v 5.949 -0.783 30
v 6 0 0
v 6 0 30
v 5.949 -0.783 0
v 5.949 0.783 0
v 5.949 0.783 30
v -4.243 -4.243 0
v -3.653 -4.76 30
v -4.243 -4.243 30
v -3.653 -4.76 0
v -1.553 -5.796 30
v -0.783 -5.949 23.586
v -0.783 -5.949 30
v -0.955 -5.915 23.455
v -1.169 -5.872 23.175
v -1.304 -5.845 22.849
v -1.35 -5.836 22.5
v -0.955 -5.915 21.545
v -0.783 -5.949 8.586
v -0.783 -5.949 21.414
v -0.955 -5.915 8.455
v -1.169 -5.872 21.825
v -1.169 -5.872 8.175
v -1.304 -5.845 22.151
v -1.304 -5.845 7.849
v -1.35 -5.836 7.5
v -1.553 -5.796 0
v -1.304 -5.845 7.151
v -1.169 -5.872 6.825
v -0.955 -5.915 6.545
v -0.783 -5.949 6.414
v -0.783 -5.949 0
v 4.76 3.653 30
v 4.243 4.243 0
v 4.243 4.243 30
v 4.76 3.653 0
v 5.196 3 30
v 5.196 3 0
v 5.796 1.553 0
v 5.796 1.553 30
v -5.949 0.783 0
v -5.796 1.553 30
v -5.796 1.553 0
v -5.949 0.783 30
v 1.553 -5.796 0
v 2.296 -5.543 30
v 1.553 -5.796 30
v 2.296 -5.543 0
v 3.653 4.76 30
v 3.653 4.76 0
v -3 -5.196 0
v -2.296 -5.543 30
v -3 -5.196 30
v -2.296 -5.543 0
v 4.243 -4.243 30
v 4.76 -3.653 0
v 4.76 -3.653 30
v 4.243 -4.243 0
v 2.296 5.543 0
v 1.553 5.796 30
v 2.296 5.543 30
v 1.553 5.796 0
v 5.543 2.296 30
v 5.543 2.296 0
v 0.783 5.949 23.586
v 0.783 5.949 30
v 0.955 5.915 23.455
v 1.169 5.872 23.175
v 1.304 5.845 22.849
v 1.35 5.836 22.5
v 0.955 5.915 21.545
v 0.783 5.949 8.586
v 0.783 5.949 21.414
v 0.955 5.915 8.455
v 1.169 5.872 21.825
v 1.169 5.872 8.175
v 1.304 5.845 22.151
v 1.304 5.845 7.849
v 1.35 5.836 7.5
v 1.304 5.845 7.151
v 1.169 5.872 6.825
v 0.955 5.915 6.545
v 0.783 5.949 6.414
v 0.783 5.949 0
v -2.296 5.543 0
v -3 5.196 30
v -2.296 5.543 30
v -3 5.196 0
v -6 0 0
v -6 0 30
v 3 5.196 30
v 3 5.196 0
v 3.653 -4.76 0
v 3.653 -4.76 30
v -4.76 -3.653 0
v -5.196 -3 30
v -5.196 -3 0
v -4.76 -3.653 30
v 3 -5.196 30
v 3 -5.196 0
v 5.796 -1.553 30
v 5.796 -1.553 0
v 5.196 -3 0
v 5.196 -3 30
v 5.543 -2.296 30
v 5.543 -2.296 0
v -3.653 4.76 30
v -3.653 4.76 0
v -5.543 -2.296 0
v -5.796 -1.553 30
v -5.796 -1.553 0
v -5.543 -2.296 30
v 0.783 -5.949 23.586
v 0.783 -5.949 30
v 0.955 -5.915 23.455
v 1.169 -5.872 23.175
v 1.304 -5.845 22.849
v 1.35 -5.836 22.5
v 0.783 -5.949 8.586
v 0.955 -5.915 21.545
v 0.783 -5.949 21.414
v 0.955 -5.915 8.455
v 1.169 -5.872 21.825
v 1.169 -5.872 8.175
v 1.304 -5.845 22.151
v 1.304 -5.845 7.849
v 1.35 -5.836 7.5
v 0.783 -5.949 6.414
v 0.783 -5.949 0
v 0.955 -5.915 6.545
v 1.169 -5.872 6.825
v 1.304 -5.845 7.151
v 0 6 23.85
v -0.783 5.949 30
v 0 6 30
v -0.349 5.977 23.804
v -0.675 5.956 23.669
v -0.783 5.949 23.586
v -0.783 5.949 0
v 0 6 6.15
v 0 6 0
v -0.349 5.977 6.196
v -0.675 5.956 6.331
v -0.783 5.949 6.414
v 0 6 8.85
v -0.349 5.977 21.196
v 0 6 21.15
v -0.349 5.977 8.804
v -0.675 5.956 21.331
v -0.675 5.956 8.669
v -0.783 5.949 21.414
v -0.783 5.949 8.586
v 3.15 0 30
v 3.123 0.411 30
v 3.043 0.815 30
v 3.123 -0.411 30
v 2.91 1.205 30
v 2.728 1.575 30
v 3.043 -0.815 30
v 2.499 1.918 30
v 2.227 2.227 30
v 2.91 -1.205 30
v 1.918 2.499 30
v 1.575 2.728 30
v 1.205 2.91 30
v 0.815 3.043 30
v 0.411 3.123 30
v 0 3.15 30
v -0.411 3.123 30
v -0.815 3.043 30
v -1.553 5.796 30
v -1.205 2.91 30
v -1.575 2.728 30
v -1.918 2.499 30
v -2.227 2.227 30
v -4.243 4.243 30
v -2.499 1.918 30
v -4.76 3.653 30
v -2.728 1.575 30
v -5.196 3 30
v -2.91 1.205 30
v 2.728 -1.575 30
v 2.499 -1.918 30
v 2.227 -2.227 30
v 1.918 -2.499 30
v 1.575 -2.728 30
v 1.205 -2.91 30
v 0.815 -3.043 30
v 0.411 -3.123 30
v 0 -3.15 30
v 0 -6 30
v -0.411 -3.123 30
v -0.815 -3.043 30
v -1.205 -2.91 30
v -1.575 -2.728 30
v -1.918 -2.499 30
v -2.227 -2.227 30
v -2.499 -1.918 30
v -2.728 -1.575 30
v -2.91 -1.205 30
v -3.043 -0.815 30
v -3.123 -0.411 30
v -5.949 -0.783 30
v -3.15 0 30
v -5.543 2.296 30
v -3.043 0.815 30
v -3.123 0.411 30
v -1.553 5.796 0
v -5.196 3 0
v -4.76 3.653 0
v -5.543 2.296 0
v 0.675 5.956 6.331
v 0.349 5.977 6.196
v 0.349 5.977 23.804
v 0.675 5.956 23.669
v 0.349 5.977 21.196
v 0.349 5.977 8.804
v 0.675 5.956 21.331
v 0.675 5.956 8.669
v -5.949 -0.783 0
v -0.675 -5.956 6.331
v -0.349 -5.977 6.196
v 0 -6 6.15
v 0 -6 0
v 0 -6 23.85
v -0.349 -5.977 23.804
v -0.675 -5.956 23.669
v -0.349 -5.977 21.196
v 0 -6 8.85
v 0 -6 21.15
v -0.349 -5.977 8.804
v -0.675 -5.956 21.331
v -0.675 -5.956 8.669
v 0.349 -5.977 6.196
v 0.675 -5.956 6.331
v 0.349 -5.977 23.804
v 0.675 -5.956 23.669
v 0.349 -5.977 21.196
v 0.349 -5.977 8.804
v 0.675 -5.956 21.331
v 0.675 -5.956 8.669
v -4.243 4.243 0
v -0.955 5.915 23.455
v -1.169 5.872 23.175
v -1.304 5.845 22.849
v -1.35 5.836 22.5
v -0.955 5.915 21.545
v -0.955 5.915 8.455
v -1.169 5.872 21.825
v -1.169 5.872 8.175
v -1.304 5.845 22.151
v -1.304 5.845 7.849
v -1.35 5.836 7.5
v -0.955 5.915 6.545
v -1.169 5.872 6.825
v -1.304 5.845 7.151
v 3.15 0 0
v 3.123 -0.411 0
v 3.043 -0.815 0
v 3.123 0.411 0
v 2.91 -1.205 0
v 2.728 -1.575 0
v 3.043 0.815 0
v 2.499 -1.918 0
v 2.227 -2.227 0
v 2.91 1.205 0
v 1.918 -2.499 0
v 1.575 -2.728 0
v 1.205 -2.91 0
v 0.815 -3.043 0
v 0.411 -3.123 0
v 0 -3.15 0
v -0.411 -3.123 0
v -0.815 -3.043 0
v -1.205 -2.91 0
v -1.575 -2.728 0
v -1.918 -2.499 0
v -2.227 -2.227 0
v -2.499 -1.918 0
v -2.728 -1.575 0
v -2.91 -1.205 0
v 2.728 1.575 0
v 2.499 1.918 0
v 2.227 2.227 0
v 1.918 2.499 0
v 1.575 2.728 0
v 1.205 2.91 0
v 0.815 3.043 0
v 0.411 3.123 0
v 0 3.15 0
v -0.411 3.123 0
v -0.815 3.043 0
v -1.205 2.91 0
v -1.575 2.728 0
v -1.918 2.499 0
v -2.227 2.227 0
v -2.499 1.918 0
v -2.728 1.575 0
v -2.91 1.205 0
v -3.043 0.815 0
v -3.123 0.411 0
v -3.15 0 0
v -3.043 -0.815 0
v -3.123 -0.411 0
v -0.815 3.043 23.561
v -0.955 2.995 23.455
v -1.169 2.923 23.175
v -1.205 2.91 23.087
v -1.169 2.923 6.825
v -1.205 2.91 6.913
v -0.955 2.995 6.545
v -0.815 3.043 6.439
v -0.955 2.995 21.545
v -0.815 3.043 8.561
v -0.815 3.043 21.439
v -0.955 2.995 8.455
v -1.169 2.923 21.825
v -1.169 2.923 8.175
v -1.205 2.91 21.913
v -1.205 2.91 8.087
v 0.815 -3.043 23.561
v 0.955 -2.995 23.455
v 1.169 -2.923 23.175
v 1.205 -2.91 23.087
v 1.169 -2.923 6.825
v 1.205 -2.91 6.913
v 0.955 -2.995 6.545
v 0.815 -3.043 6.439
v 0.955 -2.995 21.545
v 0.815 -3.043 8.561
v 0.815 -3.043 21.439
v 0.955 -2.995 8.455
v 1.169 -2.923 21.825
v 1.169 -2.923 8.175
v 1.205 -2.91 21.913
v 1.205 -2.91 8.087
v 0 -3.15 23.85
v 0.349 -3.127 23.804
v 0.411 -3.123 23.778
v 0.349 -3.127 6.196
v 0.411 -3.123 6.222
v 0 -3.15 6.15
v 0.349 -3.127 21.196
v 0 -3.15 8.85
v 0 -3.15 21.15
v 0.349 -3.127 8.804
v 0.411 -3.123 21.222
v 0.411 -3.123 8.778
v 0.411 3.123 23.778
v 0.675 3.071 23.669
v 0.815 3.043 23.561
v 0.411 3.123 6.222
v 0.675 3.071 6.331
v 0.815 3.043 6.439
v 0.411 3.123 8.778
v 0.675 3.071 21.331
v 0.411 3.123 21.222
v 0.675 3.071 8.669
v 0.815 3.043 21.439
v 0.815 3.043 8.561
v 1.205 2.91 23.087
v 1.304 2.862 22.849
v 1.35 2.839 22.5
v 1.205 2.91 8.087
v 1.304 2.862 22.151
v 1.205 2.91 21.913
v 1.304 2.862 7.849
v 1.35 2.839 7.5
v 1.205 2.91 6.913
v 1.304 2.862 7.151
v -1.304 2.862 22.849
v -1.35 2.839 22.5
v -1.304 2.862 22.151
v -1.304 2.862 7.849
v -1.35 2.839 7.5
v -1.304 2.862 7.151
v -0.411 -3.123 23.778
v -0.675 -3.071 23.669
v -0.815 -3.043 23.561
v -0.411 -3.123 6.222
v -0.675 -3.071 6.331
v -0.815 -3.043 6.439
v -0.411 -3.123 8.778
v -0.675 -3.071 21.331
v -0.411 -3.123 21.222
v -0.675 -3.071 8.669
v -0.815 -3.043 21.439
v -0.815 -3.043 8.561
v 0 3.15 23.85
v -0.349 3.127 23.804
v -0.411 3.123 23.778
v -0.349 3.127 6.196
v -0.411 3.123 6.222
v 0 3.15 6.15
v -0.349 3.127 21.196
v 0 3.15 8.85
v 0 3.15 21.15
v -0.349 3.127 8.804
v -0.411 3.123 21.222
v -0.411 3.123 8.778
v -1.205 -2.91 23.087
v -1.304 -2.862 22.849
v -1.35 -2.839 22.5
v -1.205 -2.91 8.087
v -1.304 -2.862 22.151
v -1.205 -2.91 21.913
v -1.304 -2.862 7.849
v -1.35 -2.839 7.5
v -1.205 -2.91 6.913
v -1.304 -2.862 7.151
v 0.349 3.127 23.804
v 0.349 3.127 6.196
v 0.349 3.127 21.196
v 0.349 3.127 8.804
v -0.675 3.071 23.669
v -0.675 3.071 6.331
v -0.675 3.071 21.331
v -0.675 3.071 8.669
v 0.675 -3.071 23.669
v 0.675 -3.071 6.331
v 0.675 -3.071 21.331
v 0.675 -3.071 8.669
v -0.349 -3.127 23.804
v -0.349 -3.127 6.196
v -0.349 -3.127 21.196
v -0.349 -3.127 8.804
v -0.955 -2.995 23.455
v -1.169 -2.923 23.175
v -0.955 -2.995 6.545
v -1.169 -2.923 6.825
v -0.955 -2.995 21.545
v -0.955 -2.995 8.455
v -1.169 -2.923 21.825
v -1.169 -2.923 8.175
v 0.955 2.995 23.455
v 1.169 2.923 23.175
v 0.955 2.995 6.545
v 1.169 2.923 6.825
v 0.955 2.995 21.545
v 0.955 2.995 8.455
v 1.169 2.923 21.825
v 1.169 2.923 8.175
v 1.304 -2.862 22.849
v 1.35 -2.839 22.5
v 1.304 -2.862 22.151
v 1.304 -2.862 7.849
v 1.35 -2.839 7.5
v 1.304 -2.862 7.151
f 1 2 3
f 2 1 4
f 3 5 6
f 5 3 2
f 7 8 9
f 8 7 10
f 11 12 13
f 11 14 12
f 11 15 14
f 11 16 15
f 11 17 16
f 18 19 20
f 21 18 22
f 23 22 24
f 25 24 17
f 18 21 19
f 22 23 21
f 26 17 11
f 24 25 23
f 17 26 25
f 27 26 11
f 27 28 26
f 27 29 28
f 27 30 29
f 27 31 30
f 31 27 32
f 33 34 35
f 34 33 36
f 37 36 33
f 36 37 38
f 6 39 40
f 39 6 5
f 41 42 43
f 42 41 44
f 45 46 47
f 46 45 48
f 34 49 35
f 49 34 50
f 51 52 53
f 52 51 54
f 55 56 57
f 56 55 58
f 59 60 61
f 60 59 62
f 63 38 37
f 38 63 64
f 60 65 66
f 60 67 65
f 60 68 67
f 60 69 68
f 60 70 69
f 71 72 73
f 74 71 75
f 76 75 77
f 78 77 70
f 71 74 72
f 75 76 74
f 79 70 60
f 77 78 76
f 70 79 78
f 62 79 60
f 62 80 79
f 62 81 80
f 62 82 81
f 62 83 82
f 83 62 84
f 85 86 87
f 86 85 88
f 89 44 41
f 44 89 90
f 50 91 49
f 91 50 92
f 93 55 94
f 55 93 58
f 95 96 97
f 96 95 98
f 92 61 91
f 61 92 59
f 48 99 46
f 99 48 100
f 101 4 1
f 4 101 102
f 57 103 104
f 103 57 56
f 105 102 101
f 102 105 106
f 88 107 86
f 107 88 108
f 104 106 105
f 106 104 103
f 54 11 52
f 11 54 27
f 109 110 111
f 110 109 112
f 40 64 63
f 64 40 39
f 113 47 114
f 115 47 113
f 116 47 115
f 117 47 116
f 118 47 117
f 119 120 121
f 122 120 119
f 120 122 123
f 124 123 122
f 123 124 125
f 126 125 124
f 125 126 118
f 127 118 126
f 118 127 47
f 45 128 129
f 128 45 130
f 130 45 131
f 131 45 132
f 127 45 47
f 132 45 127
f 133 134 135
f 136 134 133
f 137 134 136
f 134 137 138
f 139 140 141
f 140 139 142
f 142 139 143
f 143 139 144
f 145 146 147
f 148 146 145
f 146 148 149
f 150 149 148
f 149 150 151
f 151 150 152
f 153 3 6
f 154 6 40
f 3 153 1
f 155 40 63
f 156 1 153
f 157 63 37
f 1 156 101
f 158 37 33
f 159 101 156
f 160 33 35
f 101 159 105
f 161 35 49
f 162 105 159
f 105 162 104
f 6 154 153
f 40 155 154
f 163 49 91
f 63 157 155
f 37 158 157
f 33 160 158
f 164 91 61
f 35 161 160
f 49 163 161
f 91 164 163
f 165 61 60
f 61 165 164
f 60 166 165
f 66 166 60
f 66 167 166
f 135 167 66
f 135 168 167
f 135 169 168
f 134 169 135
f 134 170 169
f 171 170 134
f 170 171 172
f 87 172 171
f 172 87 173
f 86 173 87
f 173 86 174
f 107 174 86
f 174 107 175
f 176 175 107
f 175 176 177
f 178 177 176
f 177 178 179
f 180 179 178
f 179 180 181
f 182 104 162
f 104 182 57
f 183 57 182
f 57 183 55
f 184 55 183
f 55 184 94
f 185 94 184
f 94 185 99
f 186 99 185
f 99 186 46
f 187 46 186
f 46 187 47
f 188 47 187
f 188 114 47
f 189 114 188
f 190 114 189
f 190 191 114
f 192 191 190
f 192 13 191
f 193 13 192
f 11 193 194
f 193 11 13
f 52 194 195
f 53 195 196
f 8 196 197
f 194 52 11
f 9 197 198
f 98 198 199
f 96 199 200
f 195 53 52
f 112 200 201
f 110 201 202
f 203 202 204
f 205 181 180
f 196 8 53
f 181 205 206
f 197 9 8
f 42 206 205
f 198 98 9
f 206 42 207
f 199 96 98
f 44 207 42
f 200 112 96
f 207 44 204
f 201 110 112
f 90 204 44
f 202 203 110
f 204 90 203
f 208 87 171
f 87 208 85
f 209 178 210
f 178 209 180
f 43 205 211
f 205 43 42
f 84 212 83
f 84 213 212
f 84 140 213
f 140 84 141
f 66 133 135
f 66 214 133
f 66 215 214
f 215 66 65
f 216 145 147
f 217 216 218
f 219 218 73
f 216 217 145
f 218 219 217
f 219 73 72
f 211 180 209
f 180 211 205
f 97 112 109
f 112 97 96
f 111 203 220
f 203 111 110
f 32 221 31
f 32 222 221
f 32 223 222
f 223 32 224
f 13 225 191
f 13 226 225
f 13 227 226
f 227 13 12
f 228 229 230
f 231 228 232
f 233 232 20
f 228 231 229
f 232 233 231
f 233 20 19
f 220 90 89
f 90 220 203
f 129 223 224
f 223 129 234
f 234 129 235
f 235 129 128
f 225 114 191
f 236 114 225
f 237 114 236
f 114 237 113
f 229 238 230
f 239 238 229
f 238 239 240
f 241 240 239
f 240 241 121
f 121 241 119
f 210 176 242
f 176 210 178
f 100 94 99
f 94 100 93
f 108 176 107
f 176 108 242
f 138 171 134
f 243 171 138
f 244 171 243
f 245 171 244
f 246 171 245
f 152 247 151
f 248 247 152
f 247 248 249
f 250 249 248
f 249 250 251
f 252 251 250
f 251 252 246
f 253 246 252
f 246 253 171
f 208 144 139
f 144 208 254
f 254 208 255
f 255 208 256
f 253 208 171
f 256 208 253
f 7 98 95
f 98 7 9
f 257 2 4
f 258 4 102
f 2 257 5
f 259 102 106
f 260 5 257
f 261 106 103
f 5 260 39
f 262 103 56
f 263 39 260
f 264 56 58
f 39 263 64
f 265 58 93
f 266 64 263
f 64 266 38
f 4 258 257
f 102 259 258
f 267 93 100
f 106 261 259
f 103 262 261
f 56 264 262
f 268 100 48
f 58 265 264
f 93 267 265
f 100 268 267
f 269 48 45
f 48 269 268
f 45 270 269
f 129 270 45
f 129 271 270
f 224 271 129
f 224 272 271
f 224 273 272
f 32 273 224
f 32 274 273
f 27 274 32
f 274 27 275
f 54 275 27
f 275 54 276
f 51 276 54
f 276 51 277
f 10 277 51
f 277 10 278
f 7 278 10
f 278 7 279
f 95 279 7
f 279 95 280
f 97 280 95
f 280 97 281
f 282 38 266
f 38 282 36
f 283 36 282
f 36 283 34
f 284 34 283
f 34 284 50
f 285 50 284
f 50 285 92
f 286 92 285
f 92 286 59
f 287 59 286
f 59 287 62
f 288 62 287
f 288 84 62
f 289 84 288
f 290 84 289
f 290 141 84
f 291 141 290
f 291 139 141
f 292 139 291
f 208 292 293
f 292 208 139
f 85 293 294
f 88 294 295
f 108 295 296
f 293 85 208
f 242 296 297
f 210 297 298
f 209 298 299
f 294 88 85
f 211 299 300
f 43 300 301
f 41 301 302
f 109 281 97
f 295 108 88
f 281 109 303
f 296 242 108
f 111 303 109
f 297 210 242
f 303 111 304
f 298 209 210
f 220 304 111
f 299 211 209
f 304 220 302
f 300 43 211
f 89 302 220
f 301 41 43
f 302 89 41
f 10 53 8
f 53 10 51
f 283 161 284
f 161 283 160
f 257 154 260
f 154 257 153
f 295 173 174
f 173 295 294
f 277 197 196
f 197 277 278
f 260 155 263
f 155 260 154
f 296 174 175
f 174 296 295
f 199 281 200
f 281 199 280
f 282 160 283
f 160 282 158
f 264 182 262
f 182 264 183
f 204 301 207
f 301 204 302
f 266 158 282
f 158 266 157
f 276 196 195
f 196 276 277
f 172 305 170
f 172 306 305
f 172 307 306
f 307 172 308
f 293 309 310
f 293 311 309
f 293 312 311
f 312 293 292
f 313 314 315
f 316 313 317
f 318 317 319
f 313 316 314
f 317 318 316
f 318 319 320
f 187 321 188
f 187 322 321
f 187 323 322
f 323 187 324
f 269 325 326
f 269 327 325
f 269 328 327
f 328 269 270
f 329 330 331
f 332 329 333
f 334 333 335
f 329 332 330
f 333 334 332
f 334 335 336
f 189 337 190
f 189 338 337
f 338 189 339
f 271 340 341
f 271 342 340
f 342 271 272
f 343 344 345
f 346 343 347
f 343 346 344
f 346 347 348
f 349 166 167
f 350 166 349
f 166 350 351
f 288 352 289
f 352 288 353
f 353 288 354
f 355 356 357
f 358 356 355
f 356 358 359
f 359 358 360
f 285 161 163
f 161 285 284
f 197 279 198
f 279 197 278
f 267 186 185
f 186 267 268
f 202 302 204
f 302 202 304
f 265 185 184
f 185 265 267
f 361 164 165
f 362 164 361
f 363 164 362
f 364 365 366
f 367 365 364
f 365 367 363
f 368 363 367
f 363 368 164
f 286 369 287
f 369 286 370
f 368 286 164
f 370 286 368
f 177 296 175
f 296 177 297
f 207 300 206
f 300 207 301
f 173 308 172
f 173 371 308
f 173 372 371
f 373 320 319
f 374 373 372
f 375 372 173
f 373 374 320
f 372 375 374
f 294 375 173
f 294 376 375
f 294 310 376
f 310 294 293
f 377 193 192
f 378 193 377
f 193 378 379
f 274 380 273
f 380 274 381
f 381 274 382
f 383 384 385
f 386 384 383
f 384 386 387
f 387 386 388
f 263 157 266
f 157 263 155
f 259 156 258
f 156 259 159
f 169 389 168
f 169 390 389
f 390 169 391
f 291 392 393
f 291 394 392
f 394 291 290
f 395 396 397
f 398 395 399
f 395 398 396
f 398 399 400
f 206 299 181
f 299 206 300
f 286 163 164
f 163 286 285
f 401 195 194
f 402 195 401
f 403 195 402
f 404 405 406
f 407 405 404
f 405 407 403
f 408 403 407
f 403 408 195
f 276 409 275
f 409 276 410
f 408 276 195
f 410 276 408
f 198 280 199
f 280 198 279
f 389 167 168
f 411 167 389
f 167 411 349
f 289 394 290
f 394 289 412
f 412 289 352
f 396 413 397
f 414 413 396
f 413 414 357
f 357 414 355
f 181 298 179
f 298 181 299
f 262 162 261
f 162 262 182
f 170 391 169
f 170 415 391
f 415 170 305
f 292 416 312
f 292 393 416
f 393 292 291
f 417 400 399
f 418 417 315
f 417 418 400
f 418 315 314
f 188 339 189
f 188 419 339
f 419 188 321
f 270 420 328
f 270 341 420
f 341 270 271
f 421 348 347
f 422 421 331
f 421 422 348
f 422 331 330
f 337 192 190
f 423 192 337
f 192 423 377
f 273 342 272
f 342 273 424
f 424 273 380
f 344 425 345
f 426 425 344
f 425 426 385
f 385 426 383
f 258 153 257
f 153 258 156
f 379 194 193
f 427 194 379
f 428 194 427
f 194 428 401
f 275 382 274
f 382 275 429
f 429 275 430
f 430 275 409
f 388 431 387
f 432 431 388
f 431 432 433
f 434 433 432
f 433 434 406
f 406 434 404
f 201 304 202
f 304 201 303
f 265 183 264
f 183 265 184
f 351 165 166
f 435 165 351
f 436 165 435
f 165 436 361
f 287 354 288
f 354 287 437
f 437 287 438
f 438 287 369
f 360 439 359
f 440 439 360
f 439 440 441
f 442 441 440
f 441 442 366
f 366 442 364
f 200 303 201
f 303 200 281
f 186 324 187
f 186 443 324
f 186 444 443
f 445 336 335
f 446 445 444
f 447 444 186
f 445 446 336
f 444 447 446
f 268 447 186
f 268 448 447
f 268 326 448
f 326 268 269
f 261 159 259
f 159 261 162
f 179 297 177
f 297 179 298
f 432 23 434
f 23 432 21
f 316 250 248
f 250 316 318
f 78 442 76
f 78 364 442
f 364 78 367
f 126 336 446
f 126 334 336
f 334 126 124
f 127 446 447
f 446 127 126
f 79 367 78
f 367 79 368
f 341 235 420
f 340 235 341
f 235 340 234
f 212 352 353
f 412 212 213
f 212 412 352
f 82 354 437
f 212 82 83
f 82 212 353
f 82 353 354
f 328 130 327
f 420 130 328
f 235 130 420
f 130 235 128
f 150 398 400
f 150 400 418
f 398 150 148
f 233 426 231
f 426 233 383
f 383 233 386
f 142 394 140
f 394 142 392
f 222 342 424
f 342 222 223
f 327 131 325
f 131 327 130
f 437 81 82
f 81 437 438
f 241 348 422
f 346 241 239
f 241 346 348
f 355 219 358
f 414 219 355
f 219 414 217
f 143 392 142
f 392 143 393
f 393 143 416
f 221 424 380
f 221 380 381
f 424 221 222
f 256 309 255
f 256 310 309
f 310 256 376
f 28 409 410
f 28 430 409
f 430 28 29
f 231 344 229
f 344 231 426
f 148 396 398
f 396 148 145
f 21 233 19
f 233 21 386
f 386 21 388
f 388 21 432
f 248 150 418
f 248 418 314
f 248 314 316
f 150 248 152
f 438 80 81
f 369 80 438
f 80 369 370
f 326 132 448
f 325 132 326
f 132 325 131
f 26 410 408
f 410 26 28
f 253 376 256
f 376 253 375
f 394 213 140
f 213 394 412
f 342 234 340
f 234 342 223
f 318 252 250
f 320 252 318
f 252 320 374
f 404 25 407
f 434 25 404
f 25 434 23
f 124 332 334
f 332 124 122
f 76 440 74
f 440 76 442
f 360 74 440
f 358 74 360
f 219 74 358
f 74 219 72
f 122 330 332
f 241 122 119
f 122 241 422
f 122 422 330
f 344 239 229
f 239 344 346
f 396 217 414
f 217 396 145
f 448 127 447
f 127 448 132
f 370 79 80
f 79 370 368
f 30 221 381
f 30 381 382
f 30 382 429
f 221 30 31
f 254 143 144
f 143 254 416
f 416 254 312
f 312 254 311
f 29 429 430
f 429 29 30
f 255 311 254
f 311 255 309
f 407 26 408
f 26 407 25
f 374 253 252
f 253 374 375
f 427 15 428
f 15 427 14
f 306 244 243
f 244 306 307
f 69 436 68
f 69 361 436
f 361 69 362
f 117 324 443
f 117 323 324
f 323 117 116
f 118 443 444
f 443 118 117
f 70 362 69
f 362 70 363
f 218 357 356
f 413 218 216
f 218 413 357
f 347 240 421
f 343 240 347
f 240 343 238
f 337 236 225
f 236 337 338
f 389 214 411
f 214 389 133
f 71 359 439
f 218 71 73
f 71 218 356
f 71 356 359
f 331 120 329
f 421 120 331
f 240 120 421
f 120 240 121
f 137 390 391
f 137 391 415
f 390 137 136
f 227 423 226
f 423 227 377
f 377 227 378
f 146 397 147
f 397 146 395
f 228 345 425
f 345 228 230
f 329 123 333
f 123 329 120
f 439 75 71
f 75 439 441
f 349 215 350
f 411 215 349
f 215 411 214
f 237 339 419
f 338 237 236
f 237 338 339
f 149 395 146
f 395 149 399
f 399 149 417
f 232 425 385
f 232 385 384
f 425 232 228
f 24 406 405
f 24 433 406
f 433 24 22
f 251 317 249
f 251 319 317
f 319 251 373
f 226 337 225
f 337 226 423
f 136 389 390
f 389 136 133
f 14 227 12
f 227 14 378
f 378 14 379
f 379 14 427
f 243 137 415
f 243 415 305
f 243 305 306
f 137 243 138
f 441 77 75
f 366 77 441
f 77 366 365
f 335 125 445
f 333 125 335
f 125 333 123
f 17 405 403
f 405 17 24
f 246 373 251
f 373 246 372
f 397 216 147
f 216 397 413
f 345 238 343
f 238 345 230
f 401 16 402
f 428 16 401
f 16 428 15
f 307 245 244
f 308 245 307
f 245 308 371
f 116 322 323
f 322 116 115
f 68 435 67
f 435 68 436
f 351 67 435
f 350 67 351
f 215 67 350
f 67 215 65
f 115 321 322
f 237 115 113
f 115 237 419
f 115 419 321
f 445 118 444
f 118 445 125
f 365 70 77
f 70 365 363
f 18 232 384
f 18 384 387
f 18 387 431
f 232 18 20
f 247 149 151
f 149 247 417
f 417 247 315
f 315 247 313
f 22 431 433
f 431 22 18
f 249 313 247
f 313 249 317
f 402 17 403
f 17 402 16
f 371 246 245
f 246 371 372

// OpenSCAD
// =============================================
// Blueberry Grader - Shaft Coupler
// Joins two 125mm half-shafts into one 250mm shaft
// Print 2 per machine (one per full shaft)
// =============================================
// PRINT SETTINGS:
//   Material: PETG
//   Layer height: 0.2mm
//   Infill: 80% - this is the most stressed part
//   Brim: YES
// =============================================

shaft_d     = 6;    // must match shaft_end_d in roller_shaft.scad
coupler_d   = 12;   // outer diameter of coupler
coupler_l   = 30;   // total length - 15mm grip each side
wall        = 3;
fn          = 48;

difference() {
    cylinder(h = coupler_l, d = coupler_d, $fn = fn);

    // Hole through center
    translate([0, 0, -0.1])
        cylinder(h = coupler_l + 0.2, d = shaft_d + 0.3, $fn = fn);

    // Grub screw holes (M2.5) each side for set screws
    translate([0, coupler_d/2, coupler_l * 0.25])
        rotate([90, 0, 0])
            cylinder(h = coupler_d, d = 2.7, $fn = 24);
    translate([0, coupler_d/2, coupler_l * 0.75])
        rotate([90, 0, 0])
            cylinder(h = coupler_d, d = 2.7, $fn = 24);
}
